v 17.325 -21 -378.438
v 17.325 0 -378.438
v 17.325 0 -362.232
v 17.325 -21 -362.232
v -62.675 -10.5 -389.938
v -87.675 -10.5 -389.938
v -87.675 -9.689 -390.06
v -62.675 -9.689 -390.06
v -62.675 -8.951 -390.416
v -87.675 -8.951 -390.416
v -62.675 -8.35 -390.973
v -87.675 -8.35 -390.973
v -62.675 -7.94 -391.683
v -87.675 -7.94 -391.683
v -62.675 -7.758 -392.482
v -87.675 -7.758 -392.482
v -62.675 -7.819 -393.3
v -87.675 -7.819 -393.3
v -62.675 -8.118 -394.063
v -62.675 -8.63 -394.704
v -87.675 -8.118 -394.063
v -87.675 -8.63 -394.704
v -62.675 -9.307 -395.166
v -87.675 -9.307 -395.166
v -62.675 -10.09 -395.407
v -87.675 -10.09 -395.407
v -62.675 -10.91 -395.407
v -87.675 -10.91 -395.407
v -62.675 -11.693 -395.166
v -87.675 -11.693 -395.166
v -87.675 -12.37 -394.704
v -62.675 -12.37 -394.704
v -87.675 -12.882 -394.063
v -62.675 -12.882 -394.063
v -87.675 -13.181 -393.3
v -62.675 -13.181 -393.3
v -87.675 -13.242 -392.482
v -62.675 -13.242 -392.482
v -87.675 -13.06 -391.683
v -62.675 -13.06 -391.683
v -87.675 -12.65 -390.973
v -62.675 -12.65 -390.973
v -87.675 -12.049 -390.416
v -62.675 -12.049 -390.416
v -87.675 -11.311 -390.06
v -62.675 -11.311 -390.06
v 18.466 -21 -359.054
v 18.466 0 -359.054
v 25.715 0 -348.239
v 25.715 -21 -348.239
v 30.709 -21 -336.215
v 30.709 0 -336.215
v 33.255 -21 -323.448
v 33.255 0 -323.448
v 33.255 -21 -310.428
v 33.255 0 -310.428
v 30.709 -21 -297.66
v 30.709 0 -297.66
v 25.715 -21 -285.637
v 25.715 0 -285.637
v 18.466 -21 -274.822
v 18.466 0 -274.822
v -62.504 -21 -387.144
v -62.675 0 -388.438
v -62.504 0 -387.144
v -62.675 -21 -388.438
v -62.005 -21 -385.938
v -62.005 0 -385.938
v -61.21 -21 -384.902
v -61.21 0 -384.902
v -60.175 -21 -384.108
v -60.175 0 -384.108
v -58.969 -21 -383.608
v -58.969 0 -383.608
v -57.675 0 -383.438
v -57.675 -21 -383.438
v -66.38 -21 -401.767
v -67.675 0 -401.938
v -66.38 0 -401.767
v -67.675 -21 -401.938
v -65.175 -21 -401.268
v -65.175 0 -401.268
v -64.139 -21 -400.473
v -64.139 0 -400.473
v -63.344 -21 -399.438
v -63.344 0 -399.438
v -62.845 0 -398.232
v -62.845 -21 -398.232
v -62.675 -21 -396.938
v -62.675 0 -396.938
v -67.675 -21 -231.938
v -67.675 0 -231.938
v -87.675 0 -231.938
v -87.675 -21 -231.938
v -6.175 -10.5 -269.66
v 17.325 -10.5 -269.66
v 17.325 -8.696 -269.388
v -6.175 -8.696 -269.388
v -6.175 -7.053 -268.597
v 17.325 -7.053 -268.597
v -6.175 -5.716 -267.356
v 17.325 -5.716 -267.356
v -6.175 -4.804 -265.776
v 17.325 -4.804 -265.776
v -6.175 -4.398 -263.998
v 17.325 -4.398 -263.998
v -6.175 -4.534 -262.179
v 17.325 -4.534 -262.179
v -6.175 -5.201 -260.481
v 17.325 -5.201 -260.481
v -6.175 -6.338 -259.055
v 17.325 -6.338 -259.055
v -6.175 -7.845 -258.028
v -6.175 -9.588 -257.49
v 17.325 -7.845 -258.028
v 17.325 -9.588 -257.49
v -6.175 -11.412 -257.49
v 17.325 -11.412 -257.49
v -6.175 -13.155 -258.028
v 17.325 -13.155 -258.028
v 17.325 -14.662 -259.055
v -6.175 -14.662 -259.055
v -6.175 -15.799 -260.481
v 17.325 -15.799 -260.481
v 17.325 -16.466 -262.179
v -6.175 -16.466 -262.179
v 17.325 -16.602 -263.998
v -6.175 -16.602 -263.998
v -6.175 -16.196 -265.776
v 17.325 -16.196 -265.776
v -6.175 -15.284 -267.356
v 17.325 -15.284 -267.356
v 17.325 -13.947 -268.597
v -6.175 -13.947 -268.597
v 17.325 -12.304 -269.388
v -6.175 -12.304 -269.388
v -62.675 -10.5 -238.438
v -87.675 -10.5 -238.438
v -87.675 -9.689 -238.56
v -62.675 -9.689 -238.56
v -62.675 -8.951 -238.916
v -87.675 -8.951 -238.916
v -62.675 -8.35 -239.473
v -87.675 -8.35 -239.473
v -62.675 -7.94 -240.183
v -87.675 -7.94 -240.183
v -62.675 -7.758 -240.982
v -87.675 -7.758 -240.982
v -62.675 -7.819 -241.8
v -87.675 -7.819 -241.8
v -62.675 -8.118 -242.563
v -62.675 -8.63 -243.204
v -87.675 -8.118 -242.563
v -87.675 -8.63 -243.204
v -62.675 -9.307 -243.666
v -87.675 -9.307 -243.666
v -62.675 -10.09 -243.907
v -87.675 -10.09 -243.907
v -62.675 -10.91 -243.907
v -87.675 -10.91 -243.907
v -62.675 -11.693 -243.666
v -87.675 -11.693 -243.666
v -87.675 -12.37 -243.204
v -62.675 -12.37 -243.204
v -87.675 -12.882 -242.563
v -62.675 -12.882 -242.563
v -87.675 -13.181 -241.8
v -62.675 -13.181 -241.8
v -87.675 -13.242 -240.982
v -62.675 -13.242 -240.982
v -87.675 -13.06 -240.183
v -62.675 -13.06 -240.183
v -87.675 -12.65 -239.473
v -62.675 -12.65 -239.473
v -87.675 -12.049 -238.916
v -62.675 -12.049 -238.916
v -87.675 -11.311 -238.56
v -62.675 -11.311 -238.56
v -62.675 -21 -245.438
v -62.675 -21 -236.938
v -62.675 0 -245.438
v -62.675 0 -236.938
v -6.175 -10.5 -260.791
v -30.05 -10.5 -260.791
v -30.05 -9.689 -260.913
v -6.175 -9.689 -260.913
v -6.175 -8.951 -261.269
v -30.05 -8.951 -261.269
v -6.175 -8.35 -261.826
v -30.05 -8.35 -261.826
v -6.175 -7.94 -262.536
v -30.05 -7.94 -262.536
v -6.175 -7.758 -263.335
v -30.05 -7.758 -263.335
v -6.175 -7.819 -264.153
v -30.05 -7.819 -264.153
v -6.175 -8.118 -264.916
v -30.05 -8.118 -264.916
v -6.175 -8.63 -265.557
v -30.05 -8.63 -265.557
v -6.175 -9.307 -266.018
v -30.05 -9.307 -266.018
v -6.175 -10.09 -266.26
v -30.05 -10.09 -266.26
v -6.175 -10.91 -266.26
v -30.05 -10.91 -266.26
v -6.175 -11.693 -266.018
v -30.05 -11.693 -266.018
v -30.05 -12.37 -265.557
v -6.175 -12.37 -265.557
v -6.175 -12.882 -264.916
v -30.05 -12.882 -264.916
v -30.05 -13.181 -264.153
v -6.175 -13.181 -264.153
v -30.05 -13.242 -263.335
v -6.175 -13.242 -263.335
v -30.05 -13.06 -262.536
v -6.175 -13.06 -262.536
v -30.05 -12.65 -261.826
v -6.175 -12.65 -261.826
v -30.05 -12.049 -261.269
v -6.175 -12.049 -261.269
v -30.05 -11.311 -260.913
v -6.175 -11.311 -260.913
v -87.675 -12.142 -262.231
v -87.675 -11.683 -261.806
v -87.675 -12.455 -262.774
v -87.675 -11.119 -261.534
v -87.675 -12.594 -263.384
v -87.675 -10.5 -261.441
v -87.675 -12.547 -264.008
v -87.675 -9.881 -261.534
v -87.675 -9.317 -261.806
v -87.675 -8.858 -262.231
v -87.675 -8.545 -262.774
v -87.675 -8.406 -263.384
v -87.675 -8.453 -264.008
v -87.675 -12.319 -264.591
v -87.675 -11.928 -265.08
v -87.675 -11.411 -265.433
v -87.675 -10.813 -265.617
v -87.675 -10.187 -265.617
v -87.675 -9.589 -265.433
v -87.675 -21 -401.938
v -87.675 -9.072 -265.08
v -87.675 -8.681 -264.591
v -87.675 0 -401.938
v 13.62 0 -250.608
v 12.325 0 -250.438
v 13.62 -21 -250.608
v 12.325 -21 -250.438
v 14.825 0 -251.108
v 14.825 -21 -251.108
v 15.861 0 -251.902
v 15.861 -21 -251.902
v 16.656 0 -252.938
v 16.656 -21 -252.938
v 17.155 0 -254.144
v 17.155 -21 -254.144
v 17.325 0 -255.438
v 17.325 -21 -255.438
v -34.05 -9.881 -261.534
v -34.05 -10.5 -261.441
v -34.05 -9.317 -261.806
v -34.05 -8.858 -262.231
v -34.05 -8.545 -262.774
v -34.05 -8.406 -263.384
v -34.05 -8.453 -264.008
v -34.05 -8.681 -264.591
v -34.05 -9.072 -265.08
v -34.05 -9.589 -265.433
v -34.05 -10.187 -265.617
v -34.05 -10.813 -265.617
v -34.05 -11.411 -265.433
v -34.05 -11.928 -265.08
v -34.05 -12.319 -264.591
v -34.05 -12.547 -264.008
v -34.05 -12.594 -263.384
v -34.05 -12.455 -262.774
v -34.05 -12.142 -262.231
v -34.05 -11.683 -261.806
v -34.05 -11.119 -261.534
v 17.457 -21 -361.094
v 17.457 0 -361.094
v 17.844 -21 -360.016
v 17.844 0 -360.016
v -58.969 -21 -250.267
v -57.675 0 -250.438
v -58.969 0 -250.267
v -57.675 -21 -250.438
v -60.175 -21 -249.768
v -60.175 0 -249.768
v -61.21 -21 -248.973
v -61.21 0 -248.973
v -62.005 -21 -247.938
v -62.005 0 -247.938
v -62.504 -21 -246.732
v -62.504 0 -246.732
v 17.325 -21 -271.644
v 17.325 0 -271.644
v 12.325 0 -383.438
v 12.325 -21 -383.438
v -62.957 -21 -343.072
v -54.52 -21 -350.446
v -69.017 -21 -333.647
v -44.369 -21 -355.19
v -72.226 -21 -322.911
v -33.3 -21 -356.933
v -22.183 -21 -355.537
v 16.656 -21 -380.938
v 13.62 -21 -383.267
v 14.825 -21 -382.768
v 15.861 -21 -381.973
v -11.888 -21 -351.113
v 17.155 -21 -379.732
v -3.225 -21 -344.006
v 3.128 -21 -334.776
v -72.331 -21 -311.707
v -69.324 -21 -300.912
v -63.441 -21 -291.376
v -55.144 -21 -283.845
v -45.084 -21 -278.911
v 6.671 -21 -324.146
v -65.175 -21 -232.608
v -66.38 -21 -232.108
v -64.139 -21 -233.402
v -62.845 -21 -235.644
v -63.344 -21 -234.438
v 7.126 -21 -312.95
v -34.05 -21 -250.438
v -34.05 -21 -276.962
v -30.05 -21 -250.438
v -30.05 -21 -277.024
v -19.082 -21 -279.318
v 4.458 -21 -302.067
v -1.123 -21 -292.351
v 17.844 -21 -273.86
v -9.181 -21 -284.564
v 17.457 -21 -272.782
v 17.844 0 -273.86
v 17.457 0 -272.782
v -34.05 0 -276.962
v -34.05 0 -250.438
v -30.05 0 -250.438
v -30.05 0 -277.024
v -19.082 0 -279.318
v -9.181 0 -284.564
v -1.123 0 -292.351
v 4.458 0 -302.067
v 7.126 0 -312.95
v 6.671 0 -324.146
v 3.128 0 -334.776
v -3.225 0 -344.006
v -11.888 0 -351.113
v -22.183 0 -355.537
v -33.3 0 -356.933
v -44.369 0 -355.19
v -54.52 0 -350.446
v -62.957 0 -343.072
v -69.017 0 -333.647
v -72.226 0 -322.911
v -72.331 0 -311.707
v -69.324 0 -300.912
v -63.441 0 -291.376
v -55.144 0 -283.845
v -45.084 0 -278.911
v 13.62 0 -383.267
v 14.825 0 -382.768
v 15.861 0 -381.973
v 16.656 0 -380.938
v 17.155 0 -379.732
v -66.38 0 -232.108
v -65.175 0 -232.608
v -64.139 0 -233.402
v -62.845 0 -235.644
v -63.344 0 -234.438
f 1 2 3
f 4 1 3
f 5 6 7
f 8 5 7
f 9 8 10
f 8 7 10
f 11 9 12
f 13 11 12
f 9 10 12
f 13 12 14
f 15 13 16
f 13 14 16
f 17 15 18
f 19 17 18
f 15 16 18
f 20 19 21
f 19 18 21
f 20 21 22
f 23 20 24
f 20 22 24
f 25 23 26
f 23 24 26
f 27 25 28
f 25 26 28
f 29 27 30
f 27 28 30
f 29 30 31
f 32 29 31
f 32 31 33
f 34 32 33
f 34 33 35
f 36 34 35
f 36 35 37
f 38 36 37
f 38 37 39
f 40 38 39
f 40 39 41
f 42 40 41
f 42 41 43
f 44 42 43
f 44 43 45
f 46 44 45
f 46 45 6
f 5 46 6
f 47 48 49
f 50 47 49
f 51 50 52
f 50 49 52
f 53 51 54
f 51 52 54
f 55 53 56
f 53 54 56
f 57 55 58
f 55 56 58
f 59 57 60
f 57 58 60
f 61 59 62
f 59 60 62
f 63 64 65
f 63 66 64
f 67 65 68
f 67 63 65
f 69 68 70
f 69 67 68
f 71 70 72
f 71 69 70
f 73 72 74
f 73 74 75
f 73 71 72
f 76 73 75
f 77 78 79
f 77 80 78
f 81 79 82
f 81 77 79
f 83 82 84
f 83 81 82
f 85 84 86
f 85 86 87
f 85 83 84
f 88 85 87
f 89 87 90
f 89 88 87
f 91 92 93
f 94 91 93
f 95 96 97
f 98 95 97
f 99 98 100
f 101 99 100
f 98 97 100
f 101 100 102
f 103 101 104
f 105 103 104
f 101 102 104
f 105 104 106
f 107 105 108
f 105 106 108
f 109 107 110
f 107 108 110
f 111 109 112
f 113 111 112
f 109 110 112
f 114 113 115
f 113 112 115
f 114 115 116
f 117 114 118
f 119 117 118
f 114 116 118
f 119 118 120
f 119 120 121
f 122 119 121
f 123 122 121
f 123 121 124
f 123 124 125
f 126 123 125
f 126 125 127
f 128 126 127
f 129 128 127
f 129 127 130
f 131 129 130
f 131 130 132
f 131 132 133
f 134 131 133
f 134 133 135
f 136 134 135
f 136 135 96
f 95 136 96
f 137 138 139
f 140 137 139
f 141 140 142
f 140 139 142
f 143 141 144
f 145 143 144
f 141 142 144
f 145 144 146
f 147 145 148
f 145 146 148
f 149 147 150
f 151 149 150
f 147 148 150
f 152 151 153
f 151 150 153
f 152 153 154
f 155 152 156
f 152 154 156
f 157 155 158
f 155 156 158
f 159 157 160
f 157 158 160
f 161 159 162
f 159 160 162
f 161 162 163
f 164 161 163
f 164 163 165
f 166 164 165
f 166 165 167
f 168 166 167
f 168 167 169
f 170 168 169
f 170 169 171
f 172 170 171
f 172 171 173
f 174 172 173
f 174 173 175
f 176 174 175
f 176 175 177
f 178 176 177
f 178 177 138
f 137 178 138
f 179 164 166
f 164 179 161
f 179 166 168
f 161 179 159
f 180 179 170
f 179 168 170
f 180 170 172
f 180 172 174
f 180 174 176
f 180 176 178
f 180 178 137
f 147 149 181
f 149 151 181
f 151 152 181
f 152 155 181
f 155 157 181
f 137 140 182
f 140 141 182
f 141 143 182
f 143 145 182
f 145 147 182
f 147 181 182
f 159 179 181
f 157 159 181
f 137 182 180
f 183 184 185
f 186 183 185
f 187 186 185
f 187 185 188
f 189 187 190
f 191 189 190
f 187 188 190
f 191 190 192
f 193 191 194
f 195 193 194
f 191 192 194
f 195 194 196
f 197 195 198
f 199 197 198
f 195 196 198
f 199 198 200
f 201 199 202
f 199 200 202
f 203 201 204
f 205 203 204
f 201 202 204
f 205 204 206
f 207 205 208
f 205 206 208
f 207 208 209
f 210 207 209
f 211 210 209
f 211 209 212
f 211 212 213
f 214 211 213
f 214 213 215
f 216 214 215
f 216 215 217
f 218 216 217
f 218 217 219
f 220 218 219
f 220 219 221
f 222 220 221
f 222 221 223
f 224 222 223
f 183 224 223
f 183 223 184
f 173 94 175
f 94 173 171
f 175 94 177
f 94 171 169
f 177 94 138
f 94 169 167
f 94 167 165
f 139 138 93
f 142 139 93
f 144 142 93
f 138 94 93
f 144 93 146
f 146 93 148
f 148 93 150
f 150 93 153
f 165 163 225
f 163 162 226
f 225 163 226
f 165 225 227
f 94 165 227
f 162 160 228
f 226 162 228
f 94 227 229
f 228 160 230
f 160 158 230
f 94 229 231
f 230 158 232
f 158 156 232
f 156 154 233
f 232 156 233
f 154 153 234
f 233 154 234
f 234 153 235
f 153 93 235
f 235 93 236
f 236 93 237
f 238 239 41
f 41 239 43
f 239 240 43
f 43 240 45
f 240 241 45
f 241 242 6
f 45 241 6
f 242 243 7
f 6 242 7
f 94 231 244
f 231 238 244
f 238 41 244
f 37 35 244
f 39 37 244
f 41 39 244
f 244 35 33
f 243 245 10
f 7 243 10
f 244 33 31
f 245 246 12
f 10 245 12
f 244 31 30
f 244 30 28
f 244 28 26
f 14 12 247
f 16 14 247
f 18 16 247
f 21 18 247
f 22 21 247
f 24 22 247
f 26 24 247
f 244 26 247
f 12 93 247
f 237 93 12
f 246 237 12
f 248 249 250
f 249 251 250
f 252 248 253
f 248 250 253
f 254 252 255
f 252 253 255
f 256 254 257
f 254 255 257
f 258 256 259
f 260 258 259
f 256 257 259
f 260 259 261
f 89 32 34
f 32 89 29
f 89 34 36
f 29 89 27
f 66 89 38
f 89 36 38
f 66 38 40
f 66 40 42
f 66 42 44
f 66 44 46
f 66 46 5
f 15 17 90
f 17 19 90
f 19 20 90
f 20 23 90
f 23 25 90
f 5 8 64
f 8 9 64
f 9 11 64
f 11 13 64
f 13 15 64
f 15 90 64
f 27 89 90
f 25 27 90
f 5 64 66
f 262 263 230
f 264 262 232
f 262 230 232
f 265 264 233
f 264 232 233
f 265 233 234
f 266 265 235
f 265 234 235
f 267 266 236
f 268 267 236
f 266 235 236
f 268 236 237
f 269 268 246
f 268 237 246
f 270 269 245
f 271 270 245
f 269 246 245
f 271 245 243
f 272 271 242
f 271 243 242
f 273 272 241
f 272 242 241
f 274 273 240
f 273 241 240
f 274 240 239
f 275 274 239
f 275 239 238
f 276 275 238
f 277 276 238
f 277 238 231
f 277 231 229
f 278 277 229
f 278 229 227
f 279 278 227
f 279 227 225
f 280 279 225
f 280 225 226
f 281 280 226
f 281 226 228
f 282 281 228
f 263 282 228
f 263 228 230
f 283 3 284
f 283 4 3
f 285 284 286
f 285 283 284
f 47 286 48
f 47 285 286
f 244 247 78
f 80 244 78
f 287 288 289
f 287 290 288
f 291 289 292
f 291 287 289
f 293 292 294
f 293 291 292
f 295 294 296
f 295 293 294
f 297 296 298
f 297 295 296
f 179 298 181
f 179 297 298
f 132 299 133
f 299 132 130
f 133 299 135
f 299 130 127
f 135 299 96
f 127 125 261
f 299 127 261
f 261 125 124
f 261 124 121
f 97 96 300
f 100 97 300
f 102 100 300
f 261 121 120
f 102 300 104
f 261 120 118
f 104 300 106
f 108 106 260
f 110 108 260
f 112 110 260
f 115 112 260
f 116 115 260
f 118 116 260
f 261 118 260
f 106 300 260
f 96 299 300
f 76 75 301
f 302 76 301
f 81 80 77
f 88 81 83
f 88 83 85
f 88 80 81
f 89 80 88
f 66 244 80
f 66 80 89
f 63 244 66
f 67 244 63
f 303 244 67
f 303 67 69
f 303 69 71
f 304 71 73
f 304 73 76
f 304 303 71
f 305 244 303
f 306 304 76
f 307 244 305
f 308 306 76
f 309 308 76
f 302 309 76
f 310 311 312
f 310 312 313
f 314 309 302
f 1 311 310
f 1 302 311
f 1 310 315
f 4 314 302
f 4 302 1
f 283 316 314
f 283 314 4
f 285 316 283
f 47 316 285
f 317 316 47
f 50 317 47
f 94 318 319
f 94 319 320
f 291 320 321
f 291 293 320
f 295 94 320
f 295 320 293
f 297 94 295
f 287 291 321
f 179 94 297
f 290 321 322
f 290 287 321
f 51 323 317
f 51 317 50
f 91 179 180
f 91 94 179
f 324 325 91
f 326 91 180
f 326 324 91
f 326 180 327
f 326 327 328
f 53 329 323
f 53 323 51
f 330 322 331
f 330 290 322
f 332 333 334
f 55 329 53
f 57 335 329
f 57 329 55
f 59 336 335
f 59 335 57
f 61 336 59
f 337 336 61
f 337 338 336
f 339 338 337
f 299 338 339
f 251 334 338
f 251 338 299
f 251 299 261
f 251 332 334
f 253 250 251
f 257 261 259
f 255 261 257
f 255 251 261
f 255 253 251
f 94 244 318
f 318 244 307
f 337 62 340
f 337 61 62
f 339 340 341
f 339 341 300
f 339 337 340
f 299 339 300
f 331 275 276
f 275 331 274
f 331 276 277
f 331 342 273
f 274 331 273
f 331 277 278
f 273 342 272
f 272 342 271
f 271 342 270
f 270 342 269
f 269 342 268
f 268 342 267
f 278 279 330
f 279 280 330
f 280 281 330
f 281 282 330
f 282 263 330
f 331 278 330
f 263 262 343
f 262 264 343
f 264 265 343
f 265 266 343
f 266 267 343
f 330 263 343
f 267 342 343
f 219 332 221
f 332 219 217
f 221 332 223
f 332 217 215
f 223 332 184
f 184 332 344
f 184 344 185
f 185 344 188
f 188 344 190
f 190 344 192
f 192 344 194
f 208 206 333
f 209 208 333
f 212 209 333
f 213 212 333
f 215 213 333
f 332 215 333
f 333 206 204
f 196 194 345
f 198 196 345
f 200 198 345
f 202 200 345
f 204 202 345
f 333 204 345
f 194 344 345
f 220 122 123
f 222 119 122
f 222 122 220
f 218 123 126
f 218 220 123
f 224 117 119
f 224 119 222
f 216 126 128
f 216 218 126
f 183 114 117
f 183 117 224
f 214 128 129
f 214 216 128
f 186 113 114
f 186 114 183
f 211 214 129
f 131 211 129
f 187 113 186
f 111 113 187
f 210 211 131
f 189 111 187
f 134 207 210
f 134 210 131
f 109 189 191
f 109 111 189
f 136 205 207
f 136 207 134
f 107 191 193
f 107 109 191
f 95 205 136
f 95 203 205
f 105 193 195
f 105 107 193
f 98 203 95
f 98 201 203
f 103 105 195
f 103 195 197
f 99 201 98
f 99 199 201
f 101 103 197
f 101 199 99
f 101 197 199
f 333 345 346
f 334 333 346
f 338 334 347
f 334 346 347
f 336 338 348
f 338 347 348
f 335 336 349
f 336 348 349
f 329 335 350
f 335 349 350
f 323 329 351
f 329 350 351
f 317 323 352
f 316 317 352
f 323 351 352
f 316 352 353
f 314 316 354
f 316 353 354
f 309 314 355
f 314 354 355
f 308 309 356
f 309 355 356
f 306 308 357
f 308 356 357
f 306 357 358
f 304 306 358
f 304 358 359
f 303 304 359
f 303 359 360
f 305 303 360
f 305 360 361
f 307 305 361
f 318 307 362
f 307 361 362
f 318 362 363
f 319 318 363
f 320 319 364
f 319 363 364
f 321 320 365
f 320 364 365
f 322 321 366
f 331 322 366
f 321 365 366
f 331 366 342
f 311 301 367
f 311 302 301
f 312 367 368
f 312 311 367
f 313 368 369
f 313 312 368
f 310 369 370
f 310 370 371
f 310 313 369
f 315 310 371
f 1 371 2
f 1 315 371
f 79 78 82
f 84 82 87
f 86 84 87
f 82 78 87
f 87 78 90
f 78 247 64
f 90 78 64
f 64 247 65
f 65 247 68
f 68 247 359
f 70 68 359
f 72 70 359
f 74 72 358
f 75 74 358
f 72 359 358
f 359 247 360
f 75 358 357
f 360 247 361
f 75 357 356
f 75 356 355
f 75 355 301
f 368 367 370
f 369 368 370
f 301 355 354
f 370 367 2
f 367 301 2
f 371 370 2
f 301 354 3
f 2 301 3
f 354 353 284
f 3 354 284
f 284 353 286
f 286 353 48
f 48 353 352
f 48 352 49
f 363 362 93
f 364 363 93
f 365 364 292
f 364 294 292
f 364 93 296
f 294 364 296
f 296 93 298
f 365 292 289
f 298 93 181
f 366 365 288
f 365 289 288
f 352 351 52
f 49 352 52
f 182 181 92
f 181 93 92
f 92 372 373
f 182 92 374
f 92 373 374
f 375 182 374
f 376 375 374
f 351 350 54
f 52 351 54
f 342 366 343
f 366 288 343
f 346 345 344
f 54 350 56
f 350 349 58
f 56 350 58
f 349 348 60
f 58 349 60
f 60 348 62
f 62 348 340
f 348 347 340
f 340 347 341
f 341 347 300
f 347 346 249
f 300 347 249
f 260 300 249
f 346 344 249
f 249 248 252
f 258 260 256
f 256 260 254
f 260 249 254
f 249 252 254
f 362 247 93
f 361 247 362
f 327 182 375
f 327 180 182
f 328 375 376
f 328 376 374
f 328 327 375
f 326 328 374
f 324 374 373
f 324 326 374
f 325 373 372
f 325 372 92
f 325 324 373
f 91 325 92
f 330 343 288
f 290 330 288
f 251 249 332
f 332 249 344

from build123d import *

# Parameters (mm, degrees)
BOSS_EXTRUDE2_DEPTH                     = 21
FILLET2_R                               = 5
M5_CLEARANCE_HOLE1_D                    = 5.5
CBORE_FOR_M5_HEX_HEAD_BOLT1_D           = 5.5
CBORE_FOR_M5_HEX_HEAD_BOLT1_DEPTH       = 47.375
CBORE_FOR_M5_HEX_HEAD_BOLT1_CBORE_D     = 12.238
CBORE_FOR_M5_HEX_HEAD_BOLT1_CBORE_DEPTH = 23.5
TAP_DRILL_FOR_M5_TAP1_D                 = 4.2
TAP_DRILL_FOR_M5_TAP1_DEPTH             = 53.625


with BuildPart() as part:
    # Sketch1 → Boss-Extrude2 (new body)
    with BuildSketch(Plane(origin=(0, 0, -219.72), x_dir=(1, 0, 0), z_dir=(0, -1, 0))):
        with BuildLine():
            Line((17.325408024, -30.717863594), (-30.049591976, -30.717863594))
            Line((-30.049591976, -30.717863594), (-30.049591976, -57.304089343))
            ThreePointArc((-30.049591976, -57.304089343), (-33.300374886, -137.212968242), (-34.049591976, -57.241503392))
            Line((-34.049591976, -57.241503392), (-34.049591976, -30.717863594))
            Line((-34.049591976, -30.717863594), (-62.674591976, -30.717863594))
            Line((-62.674591976, -30.717863594), (-62.674591976, -12.217863594))
            Line((-62.674591976, -12.217863594), (-87.674591976, -12.217863594))
            Line((-87.674591976, -12.217863594), (-87.674591976, -182.217863594))
            Line((-87.674591976, -182.217863594), (-62.674591976, -182.217863594))
            Line((-62.674591976, -182.217863594), (-62.674591976, -163.717863594))
            Line((-62.674591976, -163.717863594), (17.325408024, -163.717863594))
            Line((17.325408024, -163.717863594), (17.325408024, -140.681210221))
            ThreePointArc((17.325408024, -140.681210221), (33.575408024, -97.217863594), (17.325408024, -53.754516967))
            Line((17.325408024, -53.754516967), (17.325408024, -30.717863594))
        make_face()
    extrude(amount=BOSS_EXTRUDE2_DEPTH)

    # Fillet2
    fillet2_edges = [part.edges().sort_by_distance(p)[0] for p in [
        (-62.674591976, -10.5, -250.437863594),
        (-62.674591976, -10.5, -231.937863594),
        (-62.674591976, -10.5, -401.937863594),
        (-62.674591976, -10.5, -383.437863594),
        (17.325408024, -10.5, -383.437863594),
        (17.325408024, -10.5, -360.401210221),
        (17.325408024, -10.5, -273.474516967),
        (17.325408024, -10.5, -250.437863594),
    ]]
    fillet(fillet2_edges, radius=FILLET2_R)

    # M5 Clearance Hole1 (through all)
    with Locations(Plane(origin=(17.325408024, 0, 0), x_dir=(0, 0, -1), z_dir=(1, 0, 0))):
        with Locations((392.687863594, -10.5), (241.187863594, -10.5)):
            Hole(M5_CLEARANCE_HOLE1_D / 2)

    # CBORE for M5 Hex Head Bolt1
    with Locations(Plane(origin=(17.325408024, 0, 0), x_dir=(0, 0, -1), z_dir=(1, 0, 0))):
        with Locations((263.540774929, -10.5)):
            CounterBoreHole(CBORE_FOR_M5_HEX_HEAD_BOLT1_D / 2, CBORE_FOR_M5_HEX_HEAD_BOLT1_CBORE_D / 2, CBORE_FOR_M5_HEX_HEAD_BOLT1_CBORE_DEPTH, depth=CBORE_FOR_M5_HEX_HEAD_BOLT1_DEPTH)

    # Tap Drill for M5 Tap1
    with Locations(Plane(origin=(-34.049591976, 0, 0), x_dir=(0, 0, -1), z_dir=(1, 0, 0))):
        with Locations((263.540774929, -10.5)):
            Hole(TAP_DRILL_FOR_M5_TAP1_D / 2, depth=TAP_DRILL_FOR_M5_TAP1_DEPTH)


solid = part.part
